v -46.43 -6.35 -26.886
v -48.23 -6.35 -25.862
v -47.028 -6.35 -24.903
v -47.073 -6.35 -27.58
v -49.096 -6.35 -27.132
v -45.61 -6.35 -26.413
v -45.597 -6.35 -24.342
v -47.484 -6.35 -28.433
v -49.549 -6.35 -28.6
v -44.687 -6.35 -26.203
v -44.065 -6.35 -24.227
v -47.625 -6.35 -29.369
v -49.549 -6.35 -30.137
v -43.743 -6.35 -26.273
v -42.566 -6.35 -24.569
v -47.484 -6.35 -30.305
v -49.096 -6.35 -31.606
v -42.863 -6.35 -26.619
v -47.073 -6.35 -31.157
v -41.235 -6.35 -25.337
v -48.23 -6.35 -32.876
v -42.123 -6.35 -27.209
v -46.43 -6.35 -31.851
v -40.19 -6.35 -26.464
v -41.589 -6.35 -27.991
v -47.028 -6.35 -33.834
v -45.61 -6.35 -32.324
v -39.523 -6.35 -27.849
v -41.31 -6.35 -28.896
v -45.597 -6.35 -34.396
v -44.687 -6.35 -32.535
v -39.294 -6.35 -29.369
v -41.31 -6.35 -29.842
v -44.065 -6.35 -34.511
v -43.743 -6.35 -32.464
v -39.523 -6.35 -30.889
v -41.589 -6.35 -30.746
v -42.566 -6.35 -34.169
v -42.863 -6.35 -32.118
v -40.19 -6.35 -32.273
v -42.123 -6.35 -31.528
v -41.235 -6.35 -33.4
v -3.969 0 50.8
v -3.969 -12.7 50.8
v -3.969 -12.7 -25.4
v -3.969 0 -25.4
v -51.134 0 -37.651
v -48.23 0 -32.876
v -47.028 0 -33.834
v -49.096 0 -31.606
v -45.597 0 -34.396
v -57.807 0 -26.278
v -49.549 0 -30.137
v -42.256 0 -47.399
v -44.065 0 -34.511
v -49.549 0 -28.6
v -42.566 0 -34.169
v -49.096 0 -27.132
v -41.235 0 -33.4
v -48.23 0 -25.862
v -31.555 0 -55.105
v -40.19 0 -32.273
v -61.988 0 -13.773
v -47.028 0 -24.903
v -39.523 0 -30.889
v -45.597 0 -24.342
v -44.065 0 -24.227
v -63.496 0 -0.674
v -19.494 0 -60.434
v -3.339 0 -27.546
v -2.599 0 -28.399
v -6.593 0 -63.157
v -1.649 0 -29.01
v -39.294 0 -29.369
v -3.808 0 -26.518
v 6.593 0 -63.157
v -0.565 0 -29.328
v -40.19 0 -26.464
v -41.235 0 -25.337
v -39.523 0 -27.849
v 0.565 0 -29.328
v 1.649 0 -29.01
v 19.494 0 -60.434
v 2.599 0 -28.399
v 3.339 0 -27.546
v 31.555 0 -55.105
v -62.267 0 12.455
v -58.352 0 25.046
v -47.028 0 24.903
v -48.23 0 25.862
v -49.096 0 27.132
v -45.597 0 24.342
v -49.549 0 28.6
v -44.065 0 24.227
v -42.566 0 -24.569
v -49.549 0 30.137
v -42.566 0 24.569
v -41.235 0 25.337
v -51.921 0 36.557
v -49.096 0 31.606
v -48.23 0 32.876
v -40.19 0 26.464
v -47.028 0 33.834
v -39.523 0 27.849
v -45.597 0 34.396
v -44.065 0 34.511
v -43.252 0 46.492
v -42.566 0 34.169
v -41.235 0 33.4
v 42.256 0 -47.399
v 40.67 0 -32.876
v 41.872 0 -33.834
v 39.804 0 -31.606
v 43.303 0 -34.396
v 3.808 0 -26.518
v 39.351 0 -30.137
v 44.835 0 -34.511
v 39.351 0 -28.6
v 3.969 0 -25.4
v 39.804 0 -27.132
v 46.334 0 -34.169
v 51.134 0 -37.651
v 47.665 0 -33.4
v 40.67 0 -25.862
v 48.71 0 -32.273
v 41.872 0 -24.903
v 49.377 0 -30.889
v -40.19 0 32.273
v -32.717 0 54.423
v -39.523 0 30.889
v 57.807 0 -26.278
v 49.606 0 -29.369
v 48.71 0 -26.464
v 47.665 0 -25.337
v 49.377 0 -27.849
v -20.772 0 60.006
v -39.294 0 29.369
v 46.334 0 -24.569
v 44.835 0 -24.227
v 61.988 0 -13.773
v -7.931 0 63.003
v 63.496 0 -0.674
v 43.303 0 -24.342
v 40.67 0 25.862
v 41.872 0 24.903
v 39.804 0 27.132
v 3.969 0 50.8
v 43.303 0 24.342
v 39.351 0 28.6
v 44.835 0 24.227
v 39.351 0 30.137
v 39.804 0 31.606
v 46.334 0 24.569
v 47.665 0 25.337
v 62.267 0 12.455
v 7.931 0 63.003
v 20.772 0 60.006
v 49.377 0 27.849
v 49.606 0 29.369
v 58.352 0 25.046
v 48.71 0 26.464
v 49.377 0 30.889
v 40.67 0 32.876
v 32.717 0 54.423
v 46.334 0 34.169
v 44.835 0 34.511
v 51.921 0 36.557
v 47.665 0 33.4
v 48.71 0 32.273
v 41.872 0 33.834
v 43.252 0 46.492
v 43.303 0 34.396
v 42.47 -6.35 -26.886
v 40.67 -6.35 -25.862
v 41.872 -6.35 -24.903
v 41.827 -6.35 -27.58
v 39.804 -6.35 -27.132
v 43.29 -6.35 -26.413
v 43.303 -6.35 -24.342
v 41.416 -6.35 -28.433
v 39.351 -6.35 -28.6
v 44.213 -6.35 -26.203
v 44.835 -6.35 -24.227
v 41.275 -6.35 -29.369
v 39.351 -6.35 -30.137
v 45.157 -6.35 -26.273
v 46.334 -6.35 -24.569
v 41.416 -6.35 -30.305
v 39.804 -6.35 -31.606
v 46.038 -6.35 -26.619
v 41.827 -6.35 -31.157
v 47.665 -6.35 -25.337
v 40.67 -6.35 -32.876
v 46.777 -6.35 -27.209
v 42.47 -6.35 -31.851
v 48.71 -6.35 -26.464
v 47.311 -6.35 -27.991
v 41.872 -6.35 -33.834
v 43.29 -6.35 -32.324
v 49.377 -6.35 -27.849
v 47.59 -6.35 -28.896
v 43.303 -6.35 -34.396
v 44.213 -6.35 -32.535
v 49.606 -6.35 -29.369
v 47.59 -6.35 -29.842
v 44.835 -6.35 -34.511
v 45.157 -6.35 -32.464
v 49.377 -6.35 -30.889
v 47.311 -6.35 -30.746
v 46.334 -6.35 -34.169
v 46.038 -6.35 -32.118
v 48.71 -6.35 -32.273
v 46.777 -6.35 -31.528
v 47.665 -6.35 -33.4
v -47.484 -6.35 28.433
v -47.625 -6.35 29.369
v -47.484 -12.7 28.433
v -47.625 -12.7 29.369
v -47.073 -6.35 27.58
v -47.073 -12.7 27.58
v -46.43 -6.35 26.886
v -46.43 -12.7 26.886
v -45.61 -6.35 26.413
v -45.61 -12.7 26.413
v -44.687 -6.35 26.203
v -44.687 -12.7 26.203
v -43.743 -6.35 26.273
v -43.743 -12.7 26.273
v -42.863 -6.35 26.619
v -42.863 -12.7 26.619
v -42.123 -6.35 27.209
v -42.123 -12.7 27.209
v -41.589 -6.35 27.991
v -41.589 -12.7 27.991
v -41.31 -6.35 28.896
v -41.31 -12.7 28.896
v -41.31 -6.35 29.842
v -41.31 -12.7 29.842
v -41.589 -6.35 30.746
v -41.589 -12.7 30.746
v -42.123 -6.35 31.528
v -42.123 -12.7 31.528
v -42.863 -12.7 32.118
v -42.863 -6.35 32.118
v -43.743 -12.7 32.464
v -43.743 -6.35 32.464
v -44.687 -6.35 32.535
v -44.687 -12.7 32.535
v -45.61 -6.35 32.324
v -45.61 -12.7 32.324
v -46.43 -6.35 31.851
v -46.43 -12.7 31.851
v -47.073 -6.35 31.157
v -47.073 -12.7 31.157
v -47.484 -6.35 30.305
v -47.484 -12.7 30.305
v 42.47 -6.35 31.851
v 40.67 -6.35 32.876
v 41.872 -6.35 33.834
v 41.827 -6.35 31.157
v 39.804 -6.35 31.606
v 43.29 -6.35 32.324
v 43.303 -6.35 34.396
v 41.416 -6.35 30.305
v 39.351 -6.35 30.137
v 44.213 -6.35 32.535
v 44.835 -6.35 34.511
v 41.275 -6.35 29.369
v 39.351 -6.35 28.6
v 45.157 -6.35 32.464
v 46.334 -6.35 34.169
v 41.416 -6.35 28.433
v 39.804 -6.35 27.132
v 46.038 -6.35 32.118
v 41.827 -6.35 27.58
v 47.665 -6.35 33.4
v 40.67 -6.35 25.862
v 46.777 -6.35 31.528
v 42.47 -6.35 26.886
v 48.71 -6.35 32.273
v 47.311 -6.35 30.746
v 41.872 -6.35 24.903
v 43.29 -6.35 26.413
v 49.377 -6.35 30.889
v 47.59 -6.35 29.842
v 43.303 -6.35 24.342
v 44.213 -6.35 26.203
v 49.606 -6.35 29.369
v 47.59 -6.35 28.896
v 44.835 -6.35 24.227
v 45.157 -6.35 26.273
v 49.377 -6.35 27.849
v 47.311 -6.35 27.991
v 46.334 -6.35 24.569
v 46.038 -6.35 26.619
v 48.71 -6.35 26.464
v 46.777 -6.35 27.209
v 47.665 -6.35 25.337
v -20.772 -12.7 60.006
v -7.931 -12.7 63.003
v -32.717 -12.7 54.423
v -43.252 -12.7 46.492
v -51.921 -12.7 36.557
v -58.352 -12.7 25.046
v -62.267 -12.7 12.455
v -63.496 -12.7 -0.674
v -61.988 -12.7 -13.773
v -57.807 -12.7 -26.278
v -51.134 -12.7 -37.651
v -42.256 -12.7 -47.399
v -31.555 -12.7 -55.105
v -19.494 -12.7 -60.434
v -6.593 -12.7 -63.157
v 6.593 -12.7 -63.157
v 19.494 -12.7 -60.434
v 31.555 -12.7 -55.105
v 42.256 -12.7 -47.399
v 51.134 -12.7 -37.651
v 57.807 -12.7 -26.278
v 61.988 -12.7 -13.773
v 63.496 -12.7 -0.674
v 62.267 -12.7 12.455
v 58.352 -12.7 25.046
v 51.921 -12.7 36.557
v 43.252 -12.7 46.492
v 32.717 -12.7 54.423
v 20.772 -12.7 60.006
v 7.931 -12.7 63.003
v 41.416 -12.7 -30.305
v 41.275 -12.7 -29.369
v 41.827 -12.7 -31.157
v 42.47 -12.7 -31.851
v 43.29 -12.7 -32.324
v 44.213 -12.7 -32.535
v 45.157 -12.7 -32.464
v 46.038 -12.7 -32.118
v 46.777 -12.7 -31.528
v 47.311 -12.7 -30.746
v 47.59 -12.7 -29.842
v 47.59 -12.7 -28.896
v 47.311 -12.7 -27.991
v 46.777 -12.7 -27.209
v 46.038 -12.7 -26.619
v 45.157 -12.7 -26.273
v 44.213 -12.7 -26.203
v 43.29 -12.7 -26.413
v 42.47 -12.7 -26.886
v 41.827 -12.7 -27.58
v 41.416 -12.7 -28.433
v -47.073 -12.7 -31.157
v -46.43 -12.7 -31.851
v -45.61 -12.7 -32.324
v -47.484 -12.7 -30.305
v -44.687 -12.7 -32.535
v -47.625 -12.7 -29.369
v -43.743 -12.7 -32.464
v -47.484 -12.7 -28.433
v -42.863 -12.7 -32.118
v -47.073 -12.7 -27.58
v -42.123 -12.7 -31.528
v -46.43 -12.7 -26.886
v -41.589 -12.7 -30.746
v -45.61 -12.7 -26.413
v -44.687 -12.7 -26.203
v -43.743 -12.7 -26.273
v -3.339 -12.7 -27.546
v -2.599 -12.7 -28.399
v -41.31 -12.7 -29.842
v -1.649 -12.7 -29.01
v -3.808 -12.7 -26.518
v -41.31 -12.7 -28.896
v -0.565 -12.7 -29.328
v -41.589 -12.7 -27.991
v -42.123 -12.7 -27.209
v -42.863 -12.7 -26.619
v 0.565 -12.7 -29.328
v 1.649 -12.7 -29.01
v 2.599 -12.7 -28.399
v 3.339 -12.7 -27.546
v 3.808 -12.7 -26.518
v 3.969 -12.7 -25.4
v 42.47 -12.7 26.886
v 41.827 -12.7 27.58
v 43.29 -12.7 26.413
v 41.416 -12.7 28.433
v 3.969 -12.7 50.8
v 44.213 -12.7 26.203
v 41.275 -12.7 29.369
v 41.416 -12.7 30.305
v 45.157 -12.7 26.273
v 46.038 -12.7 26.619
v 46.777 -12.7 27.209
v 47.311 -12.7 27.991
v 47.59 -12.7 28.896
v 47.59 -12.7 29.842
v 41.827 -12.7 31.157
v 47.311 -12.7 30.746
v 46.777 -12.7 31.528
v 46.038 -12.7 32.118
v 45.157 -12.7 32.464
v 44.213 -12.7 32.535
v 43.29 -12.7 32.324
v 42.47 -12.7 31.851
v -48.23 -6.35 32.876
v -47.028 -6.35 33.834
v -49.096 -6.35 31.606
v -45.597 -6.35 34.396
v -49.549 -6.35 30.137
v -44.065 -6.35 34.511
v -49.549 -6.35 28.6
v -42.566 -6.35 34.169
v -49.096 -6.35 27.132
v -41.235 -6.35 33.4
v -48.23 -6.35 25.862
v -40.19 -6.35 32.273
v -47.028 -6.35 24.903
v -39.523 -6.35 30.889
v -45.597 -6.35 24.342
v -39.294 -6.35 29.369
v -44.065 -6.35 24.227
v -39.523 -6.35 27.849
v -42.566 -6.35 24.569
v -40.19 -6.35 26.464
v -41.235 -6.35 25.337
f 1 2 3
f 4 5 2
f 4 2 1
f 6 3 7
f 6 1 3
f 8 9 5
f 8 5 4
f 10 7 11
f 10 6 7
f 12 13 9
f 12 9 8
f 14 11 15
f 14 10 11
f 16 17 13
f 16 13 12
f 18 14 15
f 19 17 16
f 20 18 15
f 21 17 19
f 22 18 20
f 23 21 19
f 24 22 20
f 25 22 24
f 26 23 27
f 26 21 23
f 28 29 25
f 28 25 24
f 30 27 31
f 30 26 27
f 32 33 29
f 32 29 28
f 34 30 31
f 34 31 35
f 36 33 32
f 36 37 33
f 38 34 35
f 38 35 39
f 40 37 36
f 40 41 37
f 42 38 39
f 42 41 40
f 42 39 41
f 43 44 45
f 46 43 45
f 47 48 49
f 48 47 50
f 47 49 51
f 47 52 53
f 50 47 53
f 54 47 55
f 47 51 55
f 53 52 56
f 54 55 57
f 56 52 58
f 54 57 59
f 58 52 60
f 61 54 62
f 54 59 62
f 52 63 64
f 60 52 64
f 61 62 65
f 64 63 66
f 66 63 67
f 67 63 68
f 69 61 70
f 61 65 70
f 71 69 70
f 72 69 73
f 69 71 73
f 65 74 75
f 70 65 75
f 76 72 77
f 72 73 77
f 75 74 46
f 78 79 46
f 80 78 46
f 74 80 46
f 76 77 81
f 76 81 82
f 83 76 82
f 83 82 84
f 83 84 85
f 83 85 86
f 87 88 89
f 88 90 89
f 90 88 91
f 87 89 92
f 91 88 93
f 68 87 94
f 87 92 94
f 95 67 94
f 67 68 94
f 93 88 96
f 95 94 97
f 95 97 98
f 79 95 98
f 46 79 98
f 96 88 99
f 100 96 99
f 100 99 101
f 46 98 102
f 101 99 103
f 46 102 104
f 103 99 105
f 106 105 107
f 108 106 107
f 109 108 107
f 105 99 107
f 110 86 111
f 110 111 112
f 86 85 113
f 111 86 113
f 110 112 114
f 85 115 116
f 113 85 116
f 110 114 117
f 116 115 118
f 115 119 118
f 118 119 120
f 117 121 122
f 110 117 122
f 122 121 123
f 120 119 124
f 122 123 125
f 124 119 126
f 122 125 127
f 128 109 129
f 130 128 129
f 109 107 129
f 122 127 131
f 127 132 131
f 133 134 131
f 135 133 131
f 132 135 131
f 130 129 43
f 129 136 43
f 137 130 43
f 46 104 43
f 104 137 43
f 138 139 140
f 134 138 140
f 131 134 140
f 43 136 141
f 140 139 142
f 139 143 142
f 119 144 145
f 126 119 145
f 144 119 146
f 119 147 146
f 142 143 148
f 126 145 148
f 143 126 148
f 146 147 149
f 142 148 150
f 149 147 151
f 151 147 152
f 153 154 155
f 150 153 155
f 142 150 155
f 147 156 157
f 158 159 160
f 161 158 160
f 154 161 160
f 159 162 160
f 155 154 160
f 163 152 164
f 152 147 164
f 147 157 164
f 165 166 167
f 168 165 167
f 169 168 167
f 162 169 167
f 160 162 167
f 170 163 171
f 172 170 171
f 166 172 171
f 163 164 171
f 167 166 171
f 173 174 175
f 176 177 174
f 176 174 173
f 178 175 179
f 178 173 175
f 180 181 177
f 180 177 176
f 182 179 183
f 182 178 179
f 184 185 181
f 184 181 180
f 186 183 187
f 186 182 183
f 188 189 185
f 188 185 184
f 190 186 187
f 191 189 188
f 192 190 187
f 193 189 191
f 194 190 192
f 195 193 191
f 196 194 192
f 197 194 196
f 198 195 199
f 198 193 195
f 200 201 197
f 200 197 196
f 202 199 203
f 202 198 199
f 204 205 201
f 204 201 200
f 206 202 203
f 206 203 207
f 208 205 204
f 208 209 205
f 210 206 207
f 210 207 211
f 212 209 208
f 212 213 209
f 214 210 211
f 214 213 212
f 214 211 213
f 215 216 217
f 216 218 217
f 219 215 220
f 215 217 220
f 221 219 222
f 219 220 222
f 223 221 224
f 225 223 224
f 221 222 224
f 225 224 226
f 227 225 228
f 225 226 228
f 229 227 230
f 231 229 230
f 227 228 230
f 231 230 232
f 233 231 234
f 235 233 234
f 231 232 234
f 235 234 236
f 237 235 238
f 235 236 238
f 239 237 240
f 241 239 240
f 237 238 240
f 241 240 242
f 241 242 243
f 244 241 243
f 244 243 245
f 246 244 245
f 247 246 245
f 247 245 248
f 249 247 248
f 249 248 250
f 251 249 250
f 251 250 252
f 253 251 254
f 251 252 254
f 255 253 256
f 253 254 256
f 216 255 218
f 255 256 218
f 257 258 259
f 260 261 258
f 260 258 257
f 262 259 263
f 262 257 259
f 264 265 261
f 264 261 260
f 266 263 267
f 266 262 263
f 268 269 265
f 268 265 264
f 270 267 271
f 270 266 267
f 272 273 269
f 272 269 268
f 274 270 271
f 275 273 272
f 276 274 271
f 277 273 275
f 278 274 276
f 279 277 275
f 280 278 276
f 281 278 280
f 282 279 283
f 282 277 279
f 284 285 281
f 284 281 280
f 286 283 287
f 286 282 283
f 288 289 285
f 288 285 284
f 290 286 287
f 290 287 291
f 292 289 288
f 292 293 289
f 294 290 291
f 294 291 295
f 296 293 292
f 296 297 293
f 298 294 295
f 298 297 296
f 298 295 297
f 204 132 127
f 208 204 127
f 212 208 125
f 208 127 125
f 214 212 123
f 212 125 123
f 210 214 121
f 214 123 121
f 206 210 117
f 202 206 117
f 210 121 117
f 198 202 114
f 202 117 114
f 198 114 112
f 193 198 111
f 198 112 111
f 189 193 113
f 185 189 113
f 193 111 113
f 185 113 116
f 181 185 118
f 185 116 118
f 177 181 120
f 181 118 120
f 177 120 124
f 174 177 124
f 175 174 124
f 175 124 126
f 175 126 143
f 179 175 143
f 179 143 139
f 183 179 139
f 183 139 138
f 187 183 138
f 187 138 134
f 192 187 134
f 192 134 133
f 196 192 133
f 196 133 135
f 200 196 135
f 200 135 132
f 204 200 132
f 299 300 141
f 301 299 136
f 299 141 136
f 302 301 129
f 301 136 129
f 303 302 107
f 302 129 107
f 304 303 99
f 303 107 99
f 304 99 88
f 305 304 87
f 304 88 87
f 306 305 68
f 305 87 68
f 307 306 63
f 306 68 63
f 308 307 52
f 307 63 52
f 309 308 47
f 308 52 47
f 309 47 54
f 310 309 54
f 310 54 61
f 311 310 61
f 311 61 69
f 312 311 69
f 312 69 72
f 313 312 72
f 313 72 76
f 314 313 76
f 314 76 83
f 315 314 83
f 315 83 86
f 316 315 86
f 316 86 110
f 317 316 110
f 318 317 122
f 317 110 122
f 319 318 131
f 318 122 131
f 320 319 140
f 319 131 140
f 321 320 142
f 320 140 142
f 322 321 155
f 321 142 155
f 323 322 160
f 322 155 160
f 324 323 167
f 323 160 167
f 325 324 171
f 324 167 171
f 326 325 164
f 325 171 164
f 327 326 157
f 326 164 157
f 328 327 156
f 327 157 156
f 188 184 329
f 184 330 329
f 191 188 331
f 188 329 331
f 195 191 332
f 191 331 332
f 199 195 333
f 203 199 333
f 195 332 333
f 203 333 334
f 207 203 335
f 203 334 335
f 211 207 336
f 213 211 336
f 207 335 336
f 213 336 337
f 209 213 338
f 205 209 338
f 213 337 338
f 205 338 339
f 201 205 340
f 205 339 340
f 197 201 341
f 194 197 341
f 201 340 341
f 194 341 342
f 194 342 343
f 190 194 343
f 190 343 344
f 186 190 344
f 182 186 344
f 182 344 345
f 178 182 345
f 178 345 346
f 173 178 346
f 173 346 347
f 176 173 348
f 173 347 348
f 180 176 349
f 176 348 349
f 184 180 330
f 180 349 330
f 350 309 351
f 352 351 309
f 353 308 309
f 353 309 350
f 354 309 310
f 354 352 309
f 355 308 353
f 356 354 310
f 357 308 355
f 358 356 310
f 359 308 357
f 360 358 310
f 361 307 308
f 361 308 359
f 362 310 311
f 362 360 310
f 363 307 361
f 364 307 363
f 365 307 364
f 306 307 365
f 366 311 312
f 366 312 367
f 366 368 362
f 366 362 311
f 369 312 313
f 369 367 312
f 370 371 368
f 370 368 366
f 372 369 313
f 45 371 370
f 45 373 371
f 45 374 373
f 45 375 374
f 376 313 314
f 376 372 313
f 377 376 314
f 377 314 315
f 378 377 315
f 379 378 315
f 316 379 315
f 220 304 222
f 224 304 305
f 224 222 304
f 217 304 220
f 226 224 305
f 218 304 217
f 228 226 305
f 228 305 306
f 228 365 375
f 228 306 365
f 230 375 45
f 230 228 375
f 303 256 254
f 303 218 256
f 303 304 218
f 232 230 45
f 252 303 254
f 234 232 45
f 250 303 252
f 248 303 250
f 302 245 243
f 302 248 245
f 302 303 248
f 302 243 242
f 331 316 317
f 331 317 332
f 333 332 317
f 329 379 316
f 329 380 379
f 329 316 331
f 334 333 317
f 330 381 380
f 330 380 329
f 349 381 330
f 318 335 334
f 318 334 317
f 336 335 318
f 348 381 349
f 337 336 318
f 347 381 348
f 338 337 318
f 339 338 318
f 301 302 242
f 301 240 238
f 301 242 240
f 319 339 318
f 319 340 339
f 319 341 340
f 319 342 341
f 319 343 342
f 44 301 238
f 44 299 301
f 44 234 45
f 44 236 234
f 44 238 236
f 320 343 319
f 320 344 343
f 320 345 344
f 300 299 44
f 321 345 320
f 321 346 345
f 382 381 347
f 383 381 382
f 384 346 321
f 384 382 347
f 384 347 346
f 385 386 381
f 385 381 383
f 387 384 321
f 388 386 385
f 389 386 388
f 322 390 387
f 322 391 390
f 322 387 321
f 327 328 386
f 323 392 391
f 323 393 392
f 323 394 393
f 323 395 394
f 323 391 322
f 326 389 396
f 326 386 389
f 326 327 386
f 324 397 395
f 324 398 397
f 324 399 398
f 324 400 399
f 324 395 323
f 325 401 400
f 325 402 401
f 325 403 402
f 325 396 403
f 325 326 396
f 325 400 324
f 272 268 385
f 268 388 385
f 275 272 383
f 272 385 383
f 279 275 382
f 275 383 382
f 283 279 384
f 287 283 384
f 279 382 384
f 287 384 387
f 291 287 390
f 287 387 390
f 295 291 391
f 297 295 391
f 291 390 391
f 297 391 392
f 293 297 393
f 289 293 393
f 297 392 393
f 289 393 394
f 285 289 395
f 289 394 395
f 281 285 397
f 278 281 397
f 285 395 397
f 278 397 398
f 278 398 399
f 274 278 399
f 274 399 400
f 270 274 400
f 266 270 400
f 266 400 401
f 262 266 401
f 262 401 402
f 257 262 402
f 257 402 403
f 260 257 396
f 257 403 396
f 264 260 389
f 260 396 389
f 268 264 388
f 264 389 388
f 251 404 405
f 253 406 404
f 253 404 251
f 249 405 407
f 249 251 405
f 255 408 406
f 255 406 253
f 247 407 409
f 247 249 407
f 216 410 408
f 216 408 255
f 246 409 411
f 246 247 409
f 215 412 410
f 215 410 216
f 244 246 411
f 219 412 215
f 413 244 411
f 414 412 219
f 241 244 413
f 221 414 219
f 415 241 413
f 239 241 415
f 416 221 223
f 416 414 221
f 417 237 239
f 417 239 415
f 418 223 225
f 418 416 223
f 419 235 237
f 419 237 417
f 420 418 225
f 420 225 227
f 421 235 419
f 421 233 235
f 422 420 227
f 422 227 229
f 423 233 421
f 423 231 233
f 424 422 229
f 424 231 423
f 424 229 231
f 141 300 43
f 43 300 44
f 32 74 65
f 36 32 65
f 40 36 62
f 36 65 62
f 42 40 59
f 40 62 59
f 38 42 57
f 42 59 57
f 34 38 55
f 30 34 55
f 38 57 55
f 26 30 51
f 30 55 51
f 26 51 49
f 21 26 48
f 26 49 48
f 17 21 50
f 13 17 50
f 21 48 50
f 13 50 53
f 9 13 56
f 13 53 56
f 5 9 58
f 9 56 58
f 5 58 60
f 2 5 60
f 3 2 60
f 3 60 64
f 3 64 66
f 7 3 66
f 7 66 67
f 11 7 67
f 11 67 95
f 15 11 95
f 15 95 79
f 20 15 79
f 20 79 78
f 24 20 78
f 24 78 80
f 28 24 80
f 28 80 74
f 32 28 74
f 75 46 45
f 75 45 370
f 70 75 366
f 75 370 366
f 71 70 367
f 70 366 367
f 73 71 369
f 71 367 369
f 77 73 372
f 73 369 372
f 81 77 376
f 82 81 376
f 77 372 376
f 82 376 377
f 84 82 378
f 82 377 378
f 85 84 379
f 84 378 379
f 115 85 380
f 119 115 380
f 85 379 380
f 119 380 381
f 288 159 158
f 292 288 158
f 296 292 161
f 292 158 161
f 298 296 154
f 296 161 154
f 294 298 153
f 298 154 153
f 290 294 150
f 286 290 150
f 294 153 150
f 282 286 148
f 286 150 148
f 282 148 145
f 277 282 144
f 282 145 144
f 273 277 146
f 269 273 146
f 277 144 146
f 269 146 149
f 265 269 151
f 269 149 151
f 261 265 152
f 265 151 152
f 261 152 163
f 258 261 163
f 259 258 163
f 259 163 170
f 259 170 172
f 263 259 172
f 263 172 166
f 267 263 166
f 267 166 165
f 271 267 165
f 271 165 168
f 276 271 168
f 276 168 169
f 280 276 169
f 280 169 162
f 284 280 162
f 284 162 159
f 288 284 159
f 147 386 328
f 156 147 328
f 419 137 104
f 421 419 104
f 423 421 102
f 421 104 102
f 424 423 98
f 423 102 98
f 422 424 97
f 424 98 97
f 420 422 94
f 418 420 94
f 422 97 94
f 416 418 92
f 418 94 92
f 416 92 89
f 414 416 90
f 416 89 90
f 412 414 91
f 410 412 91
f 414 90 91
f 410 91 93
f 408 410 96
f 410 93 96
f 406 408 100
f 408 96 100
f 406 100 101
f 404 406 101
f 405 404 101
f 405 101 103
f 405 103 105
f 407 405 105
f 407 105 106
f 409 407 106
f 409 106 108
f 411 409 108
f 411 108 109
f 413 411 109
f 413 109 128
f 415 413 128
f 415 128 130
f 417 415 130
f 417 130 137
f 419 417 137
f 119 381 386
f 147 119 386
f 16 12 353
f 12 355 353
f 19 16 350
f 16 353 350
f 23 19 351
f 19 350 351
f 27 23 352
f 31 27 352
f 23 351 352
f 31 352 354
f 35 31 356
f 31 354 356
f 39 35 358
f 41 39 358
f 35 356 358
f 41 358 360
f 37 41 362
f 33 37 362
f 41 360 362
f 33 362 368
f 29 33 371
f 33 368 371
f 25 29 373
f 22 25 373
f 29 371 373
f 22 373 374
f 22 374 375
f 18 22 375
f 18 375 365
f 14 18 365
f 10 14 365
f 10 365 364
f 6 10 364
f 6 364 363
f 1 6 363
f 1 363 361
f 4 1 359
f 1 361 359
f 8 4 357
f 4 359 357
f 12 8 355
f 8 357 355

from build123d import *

# Parameters (mm, degrees)
F0_R           = 63.5
F1_DEPTH       = 12.7
F3_DEPTH       = 25.4
F4_D           = 6.35
F4_CBORE_D     = 10.3124
F4_CBORE_DEPTH = 6.35


# Not quite as in the source:
# - a feature names something its author has since deleted; it is built from what else it names


with BuildPart() as f1:
    # F0 (on Front) → F1 (new body)
    with BuildSketch(Plane.XZ):
        Circle(F0_R)
    extrude(amount=F1_DEPTH)

    # F2 (on face) → F3 (cut)
    with BuildSketch(Plane.XZ.offset(12.7)):
        with BuildLine():
            Line((-7.93115, 63.0027527944), (-3.96875, 50.8))
            Line((-3.96875, 50.8), (-3.96875, -25.4))
            ThreePointArc((-3.96875, -25.4), (0, -29.36875), (3.96875, -25.4))
            Line((3.96875, -25.4), (3.96875, 50.8))
            Line((3.96875, 50.8), (7.93115, 63.0027527944))
            ThreePointArc((7.93115, 63.0027527944), (0, 63.5), (-7.93115, 63.0027527944))
        make_face()
    extrude(amount=-F3_DEPTH, mode=Mode.SUBTRACT)

    # F4 (through all)
    with Locations(Plane(origin=(0, 0, 0), x_dir=(1, 0, 0), z_dir=(0, 1, 0))):
        with Locations((44.45, -29.36875), (-44.45, -29.36875), (44.45, 29.36875), (-44.45, 29.36875)):
            CounterBoreHole(F4_D / 2, F4_CBORE_D / 2, F4_CBORE_DEPTH)


solid = f1.part
